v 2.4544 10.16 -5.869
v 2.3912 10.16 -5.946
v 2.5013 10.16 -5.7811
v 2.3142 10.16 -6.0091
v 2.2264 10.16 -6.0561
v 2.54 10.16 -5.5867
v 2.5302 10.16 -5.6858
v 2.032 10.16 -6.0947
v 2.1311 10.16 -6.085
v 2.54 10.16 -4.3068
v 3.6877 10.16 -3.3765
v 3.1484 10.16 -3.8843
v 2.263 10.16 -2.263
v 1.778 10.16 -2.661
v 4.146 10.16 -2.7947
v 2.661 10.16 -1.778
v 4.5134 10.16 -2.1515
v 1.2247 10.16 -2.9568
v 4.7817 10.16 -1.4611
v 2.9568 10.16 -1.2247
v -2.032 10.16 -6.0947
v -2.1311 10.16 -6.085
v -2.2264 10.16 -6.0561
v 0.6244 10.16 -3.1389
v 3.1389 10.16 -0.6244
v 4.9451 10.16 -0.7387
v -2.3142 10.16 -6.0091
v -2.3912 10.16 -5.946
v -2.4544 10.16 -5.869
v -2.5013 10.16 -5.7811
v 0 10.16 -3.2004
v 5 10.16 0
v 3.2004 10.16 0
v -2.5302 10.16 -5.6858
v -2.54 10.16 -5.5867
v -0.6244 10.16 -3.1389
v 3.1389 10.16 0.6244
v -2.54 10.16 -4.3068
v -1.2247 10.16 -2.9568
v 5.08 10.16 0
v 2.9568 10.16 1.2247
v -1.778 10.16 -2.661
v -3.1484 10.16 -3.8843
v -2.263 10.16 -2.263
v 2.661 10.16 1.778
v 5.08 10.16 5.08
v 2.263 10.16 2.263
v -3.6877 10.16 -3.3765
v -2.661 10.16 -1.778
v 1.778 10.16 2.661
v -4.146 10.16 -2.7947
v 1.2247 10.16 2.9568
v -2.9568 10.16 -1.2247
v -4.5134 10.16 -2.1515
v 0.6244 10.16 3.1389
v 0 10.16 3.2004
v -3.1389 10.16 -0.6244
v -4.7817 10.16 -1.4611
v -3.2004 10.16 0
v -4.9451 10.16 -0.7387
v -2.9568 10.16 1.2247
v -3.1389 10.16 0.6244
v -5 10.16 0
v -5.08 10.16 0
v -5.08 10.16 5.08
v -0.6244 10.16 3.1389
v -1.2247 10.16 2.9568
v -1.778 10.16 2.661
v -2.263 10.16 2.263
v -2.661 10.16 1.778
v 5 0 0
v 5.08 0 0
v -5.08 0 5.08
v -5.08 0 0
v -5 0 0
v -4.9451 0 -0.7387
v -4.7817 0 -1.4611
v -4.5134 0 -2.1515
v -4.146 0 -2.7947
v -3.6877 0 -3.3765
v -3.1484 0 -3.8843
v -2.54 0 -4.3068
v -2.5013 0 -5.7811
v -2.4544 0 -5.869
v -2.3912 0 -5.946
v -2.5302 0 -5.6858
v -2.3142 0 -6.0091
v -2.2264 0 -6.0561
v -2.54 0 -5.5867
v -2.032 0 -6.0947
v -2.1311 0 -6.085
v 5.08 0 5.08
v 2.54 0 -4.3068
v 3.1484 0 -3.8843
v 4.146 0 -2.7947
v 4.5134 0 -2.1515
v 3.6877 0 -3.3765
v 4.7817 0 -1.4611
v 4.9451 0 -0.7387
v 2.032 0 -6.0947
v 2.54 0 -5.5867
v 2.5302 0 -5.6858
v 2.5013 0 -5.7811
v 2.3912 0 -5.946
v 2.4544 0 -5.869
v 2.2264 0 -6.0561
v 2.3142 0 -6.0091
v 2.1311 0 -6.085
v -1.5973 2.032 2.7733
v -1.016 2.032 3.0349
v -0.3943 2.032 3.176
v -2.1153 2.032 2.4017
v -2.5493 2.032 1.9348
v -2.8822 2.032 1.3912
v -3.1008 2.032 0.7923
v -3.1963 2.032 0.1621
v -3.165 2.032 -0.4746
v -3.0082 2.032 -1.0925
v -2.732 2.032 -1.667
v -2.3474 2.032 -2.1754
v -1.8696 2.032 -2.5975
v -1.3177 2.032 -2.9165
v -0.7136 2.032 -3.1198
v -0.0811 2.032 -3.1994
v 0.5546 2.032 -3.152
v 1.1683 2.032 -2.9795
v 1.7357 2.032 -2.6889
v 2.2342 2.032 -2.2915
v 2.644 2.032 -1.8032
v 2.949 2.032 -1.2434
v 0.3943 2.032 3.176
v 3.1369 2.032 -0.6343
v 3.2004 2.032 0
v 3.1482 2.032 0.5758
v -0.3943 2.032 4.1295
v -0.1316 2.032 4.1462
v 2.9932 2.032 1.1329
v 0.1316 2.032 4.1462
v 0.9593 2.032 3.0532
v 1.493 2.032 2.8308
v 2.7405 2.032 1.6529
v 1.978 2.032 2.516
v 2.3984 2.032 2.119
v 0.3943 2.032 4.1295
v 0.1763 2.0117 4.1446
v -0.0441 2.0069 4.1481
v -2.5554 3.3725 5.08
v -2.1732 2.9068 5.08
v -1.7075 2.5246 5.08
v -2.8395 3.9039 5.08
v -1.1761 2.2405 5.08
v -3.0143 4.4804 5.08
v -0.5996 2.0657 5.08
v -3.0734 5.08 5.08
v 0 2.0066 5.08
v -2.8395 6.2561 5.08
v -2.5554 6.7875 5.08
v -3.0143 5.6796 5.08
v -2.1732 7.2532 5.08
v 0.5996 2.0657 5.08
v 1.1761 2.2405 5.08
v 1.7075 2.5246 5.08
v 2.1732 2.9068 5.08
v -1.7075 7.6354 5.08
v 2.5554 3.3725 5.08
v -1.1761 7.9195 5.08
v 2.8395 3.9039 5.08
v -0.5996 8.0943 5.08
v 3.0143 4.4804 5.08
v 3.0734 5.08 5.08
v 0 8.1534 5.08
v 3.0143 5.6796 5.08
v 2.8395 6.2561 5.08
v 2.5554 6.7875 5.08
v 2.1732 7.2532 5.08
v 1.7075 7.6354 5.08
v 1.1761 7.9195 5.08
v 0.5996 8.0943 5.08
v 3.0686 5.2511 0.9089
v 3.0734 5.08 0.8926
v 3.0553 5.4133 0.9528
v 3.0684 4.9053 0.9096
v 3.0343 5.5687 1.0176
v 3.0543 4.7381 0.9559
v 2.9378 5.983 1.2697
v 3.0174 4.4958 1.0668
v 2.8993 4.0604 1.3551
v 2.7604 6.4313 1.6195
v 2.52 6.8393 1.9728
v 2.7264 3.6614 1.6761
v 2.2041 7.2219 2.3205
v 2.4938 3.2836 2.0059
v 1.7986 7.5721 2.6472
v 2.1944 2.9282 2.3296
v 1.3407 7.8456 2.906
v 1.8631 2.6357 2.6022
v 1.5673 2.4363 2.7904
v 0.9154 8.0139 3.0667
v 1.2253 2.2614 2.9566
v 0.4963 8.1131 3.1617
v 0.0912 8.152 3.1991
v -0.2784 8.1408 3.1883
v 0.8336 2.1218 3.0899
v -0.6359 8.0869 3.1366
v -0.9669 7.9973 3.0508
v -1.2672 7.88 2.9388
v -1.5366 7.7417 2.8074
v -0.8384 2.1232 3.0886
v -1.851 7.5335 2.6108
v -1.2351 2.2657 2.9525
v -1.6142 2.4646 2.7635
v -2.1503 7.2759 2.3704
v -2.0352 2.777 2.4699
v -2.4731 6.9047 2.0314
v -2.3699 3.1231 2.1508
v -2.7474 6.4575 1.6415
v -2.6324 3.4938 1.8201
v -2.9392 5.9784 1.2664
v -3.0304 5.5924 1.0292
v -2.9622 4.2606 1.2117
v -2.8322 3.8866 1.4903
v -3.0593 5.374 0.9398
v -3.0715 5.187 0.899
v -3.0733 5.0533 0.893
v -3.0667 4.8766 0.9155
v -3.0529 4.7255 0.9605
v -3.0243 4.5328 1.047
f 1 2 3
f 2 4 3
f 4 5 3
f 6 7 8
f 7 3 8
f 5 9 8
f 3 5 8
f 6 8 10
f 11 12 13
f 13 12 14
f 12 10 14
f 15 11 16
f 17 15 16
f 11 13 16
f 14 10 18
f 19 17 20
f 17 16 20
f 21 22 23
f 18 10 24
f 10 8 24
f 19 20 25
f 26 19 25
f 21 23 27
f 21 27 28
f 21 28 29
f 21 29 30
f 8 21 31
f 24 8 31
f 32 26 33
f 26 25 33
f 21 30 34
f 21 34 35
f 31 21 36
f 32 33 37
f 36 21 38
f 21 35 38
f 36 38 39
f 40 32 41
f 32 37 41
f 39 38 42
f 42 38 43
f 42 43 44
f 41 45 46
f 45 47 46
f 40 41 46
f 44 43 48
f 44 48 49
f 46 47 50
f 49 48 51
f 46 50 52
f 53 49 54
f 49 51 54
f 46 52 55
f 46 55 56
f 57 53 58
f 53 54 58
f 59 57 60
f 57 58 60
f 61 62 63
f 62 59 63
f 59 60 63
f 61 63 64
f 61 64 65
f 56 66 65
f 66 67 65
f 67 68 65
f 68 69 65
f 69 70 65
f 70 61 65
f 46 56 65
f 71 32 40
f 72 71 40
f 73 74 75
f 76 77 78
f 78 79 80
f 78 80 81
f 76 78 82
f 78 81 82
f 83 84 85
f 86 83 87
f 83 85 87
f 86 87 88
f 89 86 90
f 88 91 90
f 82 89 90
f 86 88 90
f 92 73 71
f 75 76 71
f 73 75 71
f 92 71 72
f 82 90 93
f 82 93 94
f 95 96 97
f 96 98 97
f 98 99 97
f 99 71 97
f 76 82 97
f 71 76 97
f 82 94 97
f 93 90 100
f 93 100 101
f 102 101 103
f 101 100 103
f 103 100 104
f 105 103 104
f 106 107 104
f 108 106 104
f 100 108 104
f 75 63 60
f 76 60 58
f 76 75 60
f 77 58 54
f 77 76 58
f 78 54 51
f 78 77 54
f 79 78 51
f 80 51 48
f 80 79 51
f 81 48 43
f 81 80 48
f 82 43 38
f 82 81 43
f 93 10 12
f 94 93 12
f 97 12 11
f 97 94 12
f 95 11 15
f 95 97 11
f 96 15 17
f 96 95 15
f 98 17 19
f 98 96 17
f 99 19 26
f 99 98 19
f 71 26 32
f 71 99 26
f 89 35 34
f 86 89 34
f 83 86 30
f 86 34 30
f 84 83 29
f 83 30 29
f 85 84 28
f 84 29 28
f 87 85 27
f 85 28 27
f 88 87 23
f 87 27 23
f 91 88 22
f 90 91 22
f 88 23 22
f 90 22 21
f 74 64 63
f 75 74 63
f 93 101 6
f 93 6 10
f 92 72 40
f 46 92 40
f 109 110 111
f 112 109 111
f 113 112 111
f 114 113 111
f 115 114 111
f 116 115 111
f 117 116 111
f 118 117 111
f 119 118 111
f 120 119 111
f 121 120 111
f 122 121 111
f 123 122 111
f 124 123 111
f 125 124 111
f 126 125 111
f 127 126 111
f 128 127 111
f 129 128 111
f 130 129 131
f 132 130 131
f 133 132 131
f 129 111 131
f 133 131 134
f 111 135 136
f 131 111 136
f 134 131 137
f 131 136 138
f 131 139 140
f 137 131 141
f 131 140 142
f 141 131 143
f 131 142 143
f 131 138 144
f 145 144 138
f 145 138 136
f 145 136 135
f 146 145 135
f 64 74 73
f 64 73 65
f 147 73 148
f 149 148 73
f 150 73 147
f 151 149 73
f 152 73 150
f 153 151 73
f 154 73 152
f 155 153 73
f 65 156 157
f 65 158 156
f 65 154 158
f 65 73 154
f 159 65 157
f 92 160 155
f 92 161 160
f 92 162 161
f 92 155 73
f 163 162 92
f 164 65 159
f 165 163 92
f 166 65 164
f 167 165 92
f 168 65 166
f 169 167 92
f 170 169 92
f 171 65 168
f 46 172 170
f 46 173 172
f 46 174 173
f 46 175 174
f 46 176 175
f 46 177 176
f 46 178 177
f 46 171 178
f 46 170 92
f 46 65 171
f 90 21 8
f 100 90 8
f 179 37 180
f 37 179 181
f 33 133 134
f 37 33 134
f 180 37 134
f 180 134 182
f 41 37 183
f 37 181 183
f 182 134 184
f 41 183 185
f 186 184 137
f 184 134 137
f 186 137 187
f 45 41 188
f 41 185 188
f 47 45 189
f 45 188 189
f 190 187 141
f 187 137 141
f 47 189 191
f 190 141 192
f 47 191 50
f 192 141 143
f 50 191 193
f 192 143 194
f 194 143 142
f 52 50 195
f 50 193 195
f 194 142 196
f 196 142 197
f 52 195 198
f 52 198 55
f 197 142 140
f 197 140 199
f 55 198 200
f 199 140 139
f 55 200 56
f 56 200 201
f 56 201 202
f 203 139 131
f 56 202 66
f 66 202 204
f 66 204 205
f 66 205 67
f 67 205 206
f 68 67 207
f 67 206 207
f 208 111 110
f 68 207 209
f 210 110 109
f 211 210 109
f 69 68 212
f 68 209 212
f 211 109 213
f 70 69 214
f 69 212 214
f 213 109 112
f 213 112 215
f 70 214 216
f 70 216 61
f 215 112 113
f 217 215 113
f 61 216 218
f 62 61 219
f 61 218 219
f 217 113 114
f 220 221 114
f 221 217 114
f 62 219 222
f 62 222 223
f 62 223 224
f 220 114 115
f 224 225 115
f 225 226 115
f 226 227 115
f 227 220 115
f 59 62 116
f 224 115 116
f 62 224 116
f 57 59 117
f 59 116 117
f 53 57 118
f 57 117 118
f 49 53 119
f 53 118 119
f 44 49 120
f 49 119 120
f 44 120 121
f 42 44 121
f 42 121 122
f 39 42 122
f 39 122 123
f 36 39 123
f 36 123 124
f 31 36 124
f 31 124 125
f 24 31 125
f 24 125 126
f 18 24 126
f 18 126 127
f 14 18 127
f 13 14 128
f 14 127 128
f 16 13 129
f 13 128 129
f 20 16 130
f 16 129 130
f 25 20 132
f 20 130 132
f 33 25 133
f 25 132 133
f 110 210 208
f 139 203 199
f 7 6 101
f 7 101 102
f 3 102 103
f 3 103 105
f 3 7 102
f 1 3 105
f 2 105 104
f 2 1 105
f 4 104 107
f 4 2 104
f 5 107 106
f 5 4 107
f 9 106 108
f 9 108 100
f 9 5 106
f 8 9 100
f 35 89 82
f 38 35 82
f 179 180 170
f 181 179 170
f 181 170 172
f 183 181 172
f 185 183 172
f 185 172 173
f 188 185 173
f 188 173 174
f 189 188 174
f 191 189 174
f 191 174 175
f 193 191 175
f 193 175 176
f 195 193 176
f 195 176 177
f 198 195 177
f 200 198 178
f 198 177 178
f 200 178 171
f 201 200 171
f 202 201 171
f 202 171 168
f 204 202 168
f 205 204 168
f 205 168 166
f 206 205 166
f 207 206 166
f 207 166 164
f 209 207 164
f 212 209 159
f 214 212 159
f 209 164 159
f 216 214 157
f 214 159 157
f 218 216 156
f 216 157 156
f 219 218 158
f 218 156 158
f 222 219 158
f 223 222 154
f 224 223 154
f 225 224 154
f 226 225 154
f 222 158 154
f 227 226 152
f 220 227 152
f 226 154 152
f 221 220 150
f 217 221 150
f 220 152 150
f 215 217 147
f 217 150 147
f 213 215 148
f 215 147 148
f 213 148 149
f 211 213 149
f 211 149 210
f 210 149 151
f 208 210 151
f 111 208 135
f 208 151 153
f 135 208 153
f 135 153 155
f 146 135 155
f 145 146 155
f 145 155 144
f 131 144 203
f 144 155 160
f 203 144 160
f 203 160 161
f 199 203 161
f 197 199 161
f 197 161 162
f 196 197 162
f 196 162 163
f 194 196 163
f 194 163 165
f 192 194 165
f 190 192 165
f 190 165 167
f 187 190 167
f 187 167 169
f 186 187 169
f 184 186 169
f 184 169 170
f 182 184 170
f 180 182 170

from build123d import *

# Parameters (mm, degrees)
F1_R          = 5
F2_DEPTH      = 34.64052
F3_W          = 5.08
F3_H          = 2.89434
F4_DEPTH      = 34.64052
F6_W          = 2.54
F6_H          = 7.62
F7_DEPTH      = 3.81
F7_DEPTH_BACK = 3.81
F8_R          = 0.762
F9_R          = 0.508
F10_R         = 4.826
F11_DEPTH     = 2.032
F12_W         = 10.16
F12_H         = 10.16
F13_DEPTH     = 5.08
F14_R         = 3.0734
F15_DEPTH     = 5.08
F16_W         = 10.16
F16_H         = 10.16
F17_DEPTH     = 6.09474
F18_R         = 3.81
F19_DEPTH     = 8.89
F5_R          = 3.2004
F20_DEPTH     = 31.75
F21_R         = 1.27
F22_W         = 24.48052
F22_H         = 22.7021586563
F23_DEPTH     = 25.4
F24_R         = 4.1483238307
F25_DEPTH     = 2.032


with BuildPart() as f2:
    # F1 (on Front) → F2 (new body)
    with BuildSketch(Plane.XZ):
        Circle(F1_R)
    extrude(amount=-F2_DEPTH)

    # F3 (on face) → F4 (join, through all)
    with BuildSketch(Plane.XZ):
        with Locations((0, -4.64757)):
            Rectangle(F3_W, F3_H)
    extrude(amount=-F4_DEPTH)

    # F6 (on Right) → F7 (join, two sides)
    with BuildSketch(Plane.YZ) as f7_sk:
        with Locations((32.60852, 6.35)):
            Rectangle(F6_W, F6_H)
        with Locations((24.98852, 6.35)):
            Rectangle(F6_W, F6_H)
    extrude(amount=F7_DEPTH)
    extrude(f7_sk.sketch, amount=-F7_DEPTH_BACK)

    # F8
    f8_edges = [f2.edges().sort_by_distance(p)[0] for p in [
        (0, 26.25852, 10.16),
        (0, 31.33852, 10.16),
        (0, 33.87852, 10.16),
        (0, 23.71852, 10.16),
        (-3.81, 26.25852, 6.698943),
        (-3.81, 23.71852, 6.698943),
        (-3.81, 24.98852, 10.16),
        (-3.81, 31.33852, 6.698943),
        (-3.81, 32.60852, 10.16),
        (-3.81, 33.87852, 6.698943),
        (3.81, 24.98852, 10.16),
        (3.81, 26.25852, 6.698943),
        (3.81, 23.71852, 6.698943),
        (3.81, 31.33852, 6.698943),
        (3.81, 32.60852, 10.16),
        (3.81, 33.87852, 6.698943),
    ]]
    fillet(f8_edges, radius=F8_R)

    # F9
    f9_edges = [f2.edges().sort_by_distance(p)[0] for p in [
        (-2.54, 17.32026, -6.09474),
        (2.54, 17.32026, -6.09474),
    ]]
    fillet(f9_edges, radius=F9_R)

    # F10 (on face) → F11 (join)
    with BuildSketch(Plane.XZ):
        Circle(F10_R)
    extrude(amount=-F11_DEPTH)

    # F12 (on Top) → F13 (join)
    with BuildSketch(Plane.XY):
        with Locations((0, 5.08)):
            Rectangle(F12_W, F12_H)
    extrude(amount=F13_DEPTH)

    # F14 (on face) → F15 (cut)
    with BuildSketch(Plane.XY.offset(5.08)):
        with Locations((0, 5.08)):
            Circle(F14_R)
    extrude(amount=-F15_DEPTH, mode=Mode.SUBTRACT)

    # F16 (on Top) → F17 (join, through all)
    with BuildSketch(Plane.XY):
        with Locations((0, 29.56052)):
            Rectangle(F16_W, F16_H)
    extrude(amount=-F17_DEPTH)

    # F18 (on face) → F19 (cut)
    with BuildSketch(Plane(origin=(0, 0, -6.09474), x_dir=(1, 0, 0), z_dir=(0, 0, -1))):
        with Locations((0, -29.56052)):
            Circle(F18_R)
    extrude(amount=-F19_DEPTH, mode=Mode.SUBTRACT)

    # F5 (on face) → F20 (cut)
    with BuildSketch(Plane.XZ):
        Circle(F5_R)
    extrude(amount=-F20_DEPTH, mode=Mode.SUBTRACT)

    # F21
    f21_edges = [f2.edges().sort_by_distance(p)[0] for p in [
        (-2.070993, 32.758502, 2.79526),
        (3.197982, 27.489527, 2.79526),
    ]]
    fillet(f21_edges, radius=F21_R)

    # F22 (on face) → F23 (cut)
    with BuildSketch(Plane(origin=(-5.08, 0, 0), x_dir=(0, -1, 0), z_dir=(-1, 0, 0))):
        with Locations((-22.40026, 5.2563393282)):
            Rectangle(F22_W, F22_H)
    extrude(amount=-F23_DEPTH, mode=Mode.SUBTRACT)

    # F24 (on face) → F25 (join)
    with BuildSketch(Plane.XZ):
        Circle(F24_R)
    extrude(amount=-F25_DEPTH)


solid = f2.part
